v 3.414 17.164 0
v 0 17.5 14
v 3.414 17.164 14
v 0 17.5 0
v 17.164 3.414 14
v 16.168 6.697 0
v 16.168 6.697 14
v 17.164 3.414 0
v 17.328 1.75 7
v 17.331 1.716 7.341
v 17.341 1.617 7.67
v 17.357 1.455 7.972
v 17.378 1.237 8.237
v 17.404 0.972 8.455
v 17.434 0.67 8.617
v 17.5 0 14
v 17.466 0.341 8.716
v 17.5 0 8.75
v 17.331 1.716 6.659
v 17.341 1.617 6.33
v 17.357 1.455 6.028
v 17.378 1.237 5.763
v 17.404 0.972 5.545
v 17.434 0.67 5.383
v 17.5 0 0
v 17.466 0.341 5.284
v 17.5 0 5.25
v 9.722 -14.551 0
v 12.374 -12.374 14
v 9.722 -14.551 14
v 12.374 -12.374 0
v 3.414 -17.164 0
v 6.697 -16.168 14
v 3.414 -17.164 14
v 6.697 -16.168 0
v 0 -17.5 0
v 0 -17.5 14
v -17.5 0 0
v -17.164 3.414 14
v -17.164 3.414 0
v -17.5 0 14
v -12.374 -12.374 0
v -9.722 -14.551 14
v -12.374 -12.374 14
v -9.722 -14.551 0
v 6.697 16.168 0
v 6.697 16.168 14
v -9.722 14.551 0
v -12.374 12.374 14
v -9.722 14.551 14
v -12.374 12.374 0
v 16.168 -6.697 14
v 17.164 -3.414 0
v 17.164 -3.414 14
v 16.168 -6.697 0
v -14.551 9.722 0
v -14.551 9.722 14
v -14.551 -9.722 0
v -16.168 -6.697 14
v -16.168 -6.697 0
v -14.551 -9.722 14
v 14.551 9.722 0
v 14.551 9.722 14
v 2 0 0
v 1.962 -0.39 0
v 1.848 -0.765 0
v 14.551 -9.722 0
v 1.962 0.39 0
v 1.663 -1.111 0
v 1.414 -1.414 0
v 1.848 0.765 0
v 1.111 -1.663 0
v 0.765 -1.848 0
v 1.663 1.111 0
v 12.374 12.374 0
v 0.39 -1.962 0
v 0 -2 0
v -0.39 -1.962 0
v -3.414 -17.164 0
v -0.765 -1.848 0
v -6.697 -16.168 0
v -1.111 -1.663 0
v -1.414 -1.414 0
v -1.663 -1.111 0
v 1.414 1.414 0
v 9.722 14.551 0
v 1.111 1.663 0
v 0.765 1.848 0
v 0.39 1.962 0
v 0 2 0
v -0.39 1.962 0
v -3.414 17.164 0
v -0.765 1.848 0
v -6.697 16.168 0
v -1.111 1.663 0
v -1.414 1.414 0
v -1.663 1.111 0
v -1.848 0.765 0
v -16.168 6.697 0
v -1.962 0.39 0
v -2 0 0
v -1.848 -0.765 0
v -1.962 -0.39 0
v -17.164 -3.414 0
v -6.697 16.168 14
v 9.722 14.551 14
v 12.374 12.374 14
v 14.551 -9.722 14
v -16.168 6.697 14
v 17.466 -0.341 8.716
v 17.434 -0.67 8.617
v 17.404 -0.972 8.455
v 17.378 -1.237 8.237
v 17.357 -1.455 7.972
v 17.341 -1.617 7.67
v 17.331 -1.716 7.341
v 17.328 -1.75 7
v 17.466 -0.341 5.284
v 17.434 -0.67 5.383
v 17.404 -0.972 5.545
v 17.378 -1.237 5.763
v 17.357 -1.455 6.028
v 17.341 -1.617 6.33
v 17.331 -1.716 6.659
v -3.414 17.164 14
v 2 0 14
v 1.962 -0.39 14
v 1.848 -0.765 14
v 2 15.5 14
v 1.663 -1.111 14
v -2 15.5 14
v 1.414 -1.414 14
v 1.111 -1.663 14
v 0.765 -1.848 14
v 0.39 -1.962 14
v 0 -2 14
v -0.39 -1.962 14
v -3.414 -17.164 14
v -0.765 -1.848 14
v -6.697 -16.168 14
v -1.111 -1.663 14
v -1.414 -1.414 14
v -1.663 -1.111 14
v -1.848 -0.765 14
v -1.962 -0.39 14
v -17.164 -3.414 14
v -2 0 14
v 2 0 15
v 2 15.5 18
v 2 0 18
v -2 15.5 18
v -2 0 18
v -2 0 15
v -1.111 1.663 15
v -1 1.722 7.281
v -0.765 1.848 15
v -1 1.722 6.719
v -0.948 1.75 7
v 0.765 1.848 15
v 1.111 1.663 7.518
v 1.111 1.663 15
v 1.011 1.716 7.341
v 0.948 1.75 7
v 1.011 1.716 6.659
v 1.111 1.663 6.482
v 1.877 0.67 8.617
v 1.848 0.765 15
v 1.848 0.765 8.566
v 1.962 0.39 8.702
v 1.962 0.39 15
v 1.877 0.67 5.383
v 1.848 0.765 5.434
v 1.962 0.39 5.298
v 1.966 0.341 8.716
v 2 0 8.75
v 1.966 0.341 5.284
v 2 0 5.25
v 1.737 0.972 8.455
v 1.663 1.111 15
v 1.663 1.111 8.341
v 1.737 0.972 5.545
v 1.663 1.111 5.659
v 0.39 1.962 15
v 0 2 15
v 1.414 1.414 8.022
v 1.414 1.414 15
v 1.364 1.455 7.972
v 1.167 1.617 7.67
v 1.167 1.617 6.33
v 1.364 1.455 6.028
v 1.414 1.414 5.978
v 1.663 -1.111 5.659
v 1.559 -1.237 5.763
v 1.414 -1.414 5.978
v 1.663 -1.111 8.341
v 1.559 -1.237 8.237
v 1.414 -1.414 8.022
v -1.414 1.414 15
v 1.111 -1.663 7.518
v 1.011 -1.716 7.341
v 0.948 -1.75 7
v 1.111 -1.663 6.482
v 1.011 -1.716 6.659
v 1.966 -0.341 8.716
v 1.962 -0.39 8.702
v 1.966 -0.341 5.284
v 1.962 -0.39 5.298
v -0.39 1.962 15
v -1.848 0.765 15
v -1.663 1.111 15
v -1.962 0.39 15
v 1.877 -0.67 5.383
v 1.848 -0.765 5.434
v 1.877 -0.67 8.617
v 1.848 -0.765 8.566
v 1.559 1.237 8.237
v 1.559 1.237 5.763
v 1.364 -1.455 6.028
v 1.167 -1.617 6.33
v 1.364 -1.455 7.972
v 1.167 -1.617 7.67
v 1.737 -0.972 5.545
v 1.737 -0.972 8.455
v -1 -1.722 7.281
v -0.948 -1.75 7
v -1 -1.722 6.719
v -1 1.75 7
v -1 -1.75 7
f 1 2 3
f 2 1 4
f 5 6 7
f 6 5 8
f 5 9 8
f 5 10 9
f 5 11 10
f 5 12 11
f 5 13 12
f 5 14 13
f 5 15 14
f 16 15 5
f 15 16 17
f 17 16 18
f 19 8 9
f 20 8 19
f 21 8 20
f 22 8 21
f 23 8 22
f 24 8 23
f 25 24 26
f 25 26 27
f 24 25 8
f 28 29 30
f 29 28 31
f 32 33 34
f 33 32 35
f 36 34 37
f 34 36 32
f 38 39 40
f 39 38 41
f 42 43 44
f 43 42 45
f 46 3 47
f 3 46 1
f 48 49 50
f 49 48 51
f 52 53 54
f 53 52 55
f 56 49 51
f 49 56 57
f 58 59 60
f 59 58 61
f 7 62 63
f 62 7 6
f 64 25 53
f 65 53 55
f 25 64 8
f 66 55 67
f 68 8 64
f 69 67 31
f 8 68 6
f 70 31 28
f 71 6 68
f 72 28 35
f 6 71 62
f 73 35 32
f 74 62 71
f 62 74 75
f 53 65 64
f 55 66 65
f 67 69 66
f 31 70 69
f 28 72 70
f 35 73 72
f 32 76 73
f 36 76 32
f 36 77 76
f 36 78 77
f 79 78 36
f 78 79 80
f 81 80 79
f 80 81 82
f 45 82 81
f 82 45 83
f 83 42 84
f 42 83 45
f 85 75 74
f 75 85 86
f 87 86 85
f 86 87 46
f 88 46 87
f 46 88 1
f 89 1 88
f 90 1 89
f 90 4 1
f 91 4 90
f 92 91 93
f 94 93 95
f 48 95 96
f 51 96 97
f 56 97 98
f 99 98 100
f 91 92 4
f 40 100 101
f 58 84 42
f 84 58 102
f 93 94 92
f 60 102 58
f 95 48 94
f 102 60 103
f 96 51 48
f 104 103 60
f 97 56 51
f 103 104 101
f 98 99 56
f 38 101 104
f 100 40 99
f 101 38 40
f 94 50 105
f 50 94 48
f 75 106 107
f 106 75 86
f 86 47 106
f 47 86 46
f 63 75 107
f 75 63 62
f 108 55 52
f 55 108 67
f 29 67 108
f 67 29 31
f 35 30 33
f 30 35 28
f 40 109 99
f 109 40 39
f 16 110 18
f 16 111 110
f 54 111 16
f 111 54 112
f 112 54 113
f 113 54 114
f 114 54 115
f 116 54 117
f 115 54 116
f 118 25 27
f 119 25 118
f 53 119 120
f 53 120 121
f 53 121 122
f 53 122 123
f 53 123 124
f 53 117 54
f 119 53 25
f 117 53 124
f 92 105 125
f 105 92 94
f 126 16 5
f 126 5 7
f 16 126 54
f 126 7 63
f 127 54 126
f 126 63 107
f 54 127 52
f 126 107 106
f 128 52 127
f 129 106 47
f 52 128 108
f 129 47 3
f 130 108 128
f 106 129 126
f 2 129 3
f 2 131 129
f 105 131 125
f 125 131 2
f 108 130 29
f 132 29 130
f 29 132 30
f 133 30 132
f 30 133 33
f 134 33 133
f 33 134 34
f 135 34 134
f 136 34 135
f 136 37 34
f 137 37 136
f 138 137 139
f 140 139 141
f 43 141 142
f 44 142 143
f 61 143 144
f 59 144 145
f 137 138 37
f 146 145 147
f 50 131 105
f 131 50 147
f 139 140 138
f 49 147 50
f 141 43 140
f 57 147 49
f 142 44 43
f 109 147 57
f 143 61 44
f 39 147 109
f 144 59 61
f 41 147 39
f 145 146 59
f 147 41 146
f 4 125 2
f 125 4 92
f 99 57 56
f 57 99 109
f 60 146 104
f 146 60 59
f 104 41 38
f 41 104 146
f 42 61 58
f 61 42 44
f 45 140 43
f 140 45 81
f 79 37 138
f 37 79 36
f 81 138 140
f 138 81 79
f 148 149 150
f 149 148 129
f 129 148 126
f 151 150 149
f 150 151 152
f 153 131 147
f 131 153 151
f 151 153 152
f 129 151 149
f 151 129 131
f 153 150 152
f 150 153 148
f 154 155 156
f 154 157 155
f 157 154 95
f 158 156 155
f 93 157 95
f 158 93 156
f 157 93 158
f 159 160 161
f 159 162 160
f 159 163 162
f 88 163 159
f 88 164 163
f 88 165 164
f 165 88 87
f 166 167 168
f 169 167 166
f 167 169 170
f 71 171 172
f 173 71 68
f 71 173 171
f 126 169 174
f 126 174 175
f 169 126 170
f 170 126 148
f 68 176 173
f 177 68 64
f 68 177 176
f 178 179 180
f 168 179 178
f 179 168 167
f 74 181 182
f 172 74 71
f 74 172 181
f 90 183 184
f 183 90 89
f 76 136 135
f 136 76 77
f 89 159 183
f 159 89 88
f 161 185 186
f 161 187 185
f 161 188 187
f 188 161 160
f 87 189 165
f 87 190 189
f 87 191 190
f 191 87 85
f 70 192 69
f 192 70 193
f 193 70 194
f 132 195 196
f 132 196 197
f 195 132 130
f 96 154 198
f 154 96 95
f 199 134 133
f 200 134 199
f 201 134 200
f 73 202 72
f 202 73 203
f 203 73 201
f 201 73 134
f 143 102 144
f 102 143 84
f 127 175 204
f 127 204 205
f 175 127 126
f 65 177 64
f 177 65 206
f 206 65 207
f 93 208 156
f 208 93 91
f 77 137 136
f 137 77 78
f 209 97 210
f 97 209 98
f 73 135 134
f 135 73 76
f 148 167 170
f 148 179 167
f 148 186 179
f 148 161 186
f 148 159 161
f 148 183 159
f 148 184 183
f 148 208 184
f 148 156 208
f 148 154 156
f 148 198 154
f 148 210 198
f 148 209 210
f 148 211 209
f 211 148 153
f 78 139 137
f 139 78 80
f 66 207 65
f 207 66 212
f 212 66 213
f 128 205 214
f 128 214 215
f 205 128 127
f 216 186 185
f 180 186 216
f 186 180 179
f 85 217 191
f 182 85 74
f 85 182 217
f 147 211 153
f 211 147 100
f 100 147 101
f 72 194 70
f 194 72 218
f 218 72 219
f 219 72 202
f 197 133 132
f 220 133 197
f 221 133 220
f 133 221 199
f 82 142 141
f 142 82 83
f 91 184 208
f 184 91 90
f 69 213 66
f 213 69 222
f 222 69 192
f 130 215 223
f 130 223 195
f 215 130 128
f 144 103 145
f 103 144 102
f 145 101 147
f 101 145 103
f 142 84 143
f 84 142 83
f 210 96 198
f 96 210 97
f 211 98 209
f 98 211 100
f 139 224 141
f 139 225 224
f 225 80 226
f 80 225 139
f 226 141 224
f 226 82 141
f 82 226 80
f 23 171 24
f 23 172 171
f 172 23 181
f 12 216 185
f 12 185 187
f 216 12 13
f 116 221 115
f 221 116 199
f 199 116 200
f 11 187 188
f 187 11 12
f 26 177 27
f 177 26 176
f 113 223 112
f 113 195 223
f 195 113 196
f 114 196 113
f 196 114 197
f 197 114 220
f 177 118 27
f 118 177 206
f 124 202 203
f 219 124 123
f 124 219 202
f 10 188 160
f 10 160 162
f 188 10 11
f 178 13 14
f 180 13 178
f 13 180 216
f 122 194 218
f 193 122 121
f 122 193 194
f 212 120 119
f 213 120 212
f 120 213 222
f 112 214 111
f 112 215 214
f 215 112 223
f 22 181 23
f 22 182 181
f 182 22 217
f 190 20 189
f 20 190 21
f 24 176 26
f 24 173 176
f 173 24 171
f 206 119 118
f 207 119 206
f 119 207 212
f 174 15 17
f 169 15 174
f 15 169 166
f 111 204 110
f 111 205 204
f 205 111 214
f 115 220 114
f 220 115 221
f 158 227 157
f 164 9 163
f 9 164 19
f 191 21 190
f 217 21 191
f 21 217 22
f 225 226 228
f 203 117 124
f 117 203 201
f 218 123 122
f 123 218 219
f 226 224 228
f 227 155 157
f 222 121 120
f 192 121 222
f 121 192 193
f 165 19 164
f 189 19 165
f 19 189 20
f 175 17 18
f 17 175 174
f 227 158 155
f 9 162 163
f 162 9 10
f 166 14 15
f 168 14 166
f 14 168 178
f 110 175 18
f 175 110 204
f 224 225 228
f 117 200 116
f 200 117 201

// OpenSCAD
$fn = 32;

// ----------------------------------------------------------------------
// Control knob: pointer knob
// ----------------------------------------------------------------------

// --- parameters (mm) ---
rib_w = 4;                // pointer rib width
rib_h = 5;                // pointer rib height
knob_d = 35;              // knob body diameter
knob_h = 14;              // knob body height
bore_d = 4;               // shaft bore diameter
set_d = 3.5;              // set screw bore diameter
fit_tol = 0.1;            // tolerance for press fits, mm
free_tol = 0.3;           // tolerance for clearance fits, mm

rib_poke = rib_h - 1;  // rib height above the top
total_h = knob_h + rib_h - 1;  // overall height

difference() {
  union() {
    cylinder(h = knob_h, d = knob_d);
    translate([-rib_w / 2, 0, knob_h - 1])
      cube([rib_w, knob_d / 2 - 2, rib_h]);
  }
  translate([0, 0, -1]) cylinder(h = knob_h + 2, d = bore_d);
  translate([-1, 0, knob_h / 2]) rotate([0, 90, 0])
    cylinder(h = knob_d / 2 + bore_d / 2 + 2, d = set_d);}
